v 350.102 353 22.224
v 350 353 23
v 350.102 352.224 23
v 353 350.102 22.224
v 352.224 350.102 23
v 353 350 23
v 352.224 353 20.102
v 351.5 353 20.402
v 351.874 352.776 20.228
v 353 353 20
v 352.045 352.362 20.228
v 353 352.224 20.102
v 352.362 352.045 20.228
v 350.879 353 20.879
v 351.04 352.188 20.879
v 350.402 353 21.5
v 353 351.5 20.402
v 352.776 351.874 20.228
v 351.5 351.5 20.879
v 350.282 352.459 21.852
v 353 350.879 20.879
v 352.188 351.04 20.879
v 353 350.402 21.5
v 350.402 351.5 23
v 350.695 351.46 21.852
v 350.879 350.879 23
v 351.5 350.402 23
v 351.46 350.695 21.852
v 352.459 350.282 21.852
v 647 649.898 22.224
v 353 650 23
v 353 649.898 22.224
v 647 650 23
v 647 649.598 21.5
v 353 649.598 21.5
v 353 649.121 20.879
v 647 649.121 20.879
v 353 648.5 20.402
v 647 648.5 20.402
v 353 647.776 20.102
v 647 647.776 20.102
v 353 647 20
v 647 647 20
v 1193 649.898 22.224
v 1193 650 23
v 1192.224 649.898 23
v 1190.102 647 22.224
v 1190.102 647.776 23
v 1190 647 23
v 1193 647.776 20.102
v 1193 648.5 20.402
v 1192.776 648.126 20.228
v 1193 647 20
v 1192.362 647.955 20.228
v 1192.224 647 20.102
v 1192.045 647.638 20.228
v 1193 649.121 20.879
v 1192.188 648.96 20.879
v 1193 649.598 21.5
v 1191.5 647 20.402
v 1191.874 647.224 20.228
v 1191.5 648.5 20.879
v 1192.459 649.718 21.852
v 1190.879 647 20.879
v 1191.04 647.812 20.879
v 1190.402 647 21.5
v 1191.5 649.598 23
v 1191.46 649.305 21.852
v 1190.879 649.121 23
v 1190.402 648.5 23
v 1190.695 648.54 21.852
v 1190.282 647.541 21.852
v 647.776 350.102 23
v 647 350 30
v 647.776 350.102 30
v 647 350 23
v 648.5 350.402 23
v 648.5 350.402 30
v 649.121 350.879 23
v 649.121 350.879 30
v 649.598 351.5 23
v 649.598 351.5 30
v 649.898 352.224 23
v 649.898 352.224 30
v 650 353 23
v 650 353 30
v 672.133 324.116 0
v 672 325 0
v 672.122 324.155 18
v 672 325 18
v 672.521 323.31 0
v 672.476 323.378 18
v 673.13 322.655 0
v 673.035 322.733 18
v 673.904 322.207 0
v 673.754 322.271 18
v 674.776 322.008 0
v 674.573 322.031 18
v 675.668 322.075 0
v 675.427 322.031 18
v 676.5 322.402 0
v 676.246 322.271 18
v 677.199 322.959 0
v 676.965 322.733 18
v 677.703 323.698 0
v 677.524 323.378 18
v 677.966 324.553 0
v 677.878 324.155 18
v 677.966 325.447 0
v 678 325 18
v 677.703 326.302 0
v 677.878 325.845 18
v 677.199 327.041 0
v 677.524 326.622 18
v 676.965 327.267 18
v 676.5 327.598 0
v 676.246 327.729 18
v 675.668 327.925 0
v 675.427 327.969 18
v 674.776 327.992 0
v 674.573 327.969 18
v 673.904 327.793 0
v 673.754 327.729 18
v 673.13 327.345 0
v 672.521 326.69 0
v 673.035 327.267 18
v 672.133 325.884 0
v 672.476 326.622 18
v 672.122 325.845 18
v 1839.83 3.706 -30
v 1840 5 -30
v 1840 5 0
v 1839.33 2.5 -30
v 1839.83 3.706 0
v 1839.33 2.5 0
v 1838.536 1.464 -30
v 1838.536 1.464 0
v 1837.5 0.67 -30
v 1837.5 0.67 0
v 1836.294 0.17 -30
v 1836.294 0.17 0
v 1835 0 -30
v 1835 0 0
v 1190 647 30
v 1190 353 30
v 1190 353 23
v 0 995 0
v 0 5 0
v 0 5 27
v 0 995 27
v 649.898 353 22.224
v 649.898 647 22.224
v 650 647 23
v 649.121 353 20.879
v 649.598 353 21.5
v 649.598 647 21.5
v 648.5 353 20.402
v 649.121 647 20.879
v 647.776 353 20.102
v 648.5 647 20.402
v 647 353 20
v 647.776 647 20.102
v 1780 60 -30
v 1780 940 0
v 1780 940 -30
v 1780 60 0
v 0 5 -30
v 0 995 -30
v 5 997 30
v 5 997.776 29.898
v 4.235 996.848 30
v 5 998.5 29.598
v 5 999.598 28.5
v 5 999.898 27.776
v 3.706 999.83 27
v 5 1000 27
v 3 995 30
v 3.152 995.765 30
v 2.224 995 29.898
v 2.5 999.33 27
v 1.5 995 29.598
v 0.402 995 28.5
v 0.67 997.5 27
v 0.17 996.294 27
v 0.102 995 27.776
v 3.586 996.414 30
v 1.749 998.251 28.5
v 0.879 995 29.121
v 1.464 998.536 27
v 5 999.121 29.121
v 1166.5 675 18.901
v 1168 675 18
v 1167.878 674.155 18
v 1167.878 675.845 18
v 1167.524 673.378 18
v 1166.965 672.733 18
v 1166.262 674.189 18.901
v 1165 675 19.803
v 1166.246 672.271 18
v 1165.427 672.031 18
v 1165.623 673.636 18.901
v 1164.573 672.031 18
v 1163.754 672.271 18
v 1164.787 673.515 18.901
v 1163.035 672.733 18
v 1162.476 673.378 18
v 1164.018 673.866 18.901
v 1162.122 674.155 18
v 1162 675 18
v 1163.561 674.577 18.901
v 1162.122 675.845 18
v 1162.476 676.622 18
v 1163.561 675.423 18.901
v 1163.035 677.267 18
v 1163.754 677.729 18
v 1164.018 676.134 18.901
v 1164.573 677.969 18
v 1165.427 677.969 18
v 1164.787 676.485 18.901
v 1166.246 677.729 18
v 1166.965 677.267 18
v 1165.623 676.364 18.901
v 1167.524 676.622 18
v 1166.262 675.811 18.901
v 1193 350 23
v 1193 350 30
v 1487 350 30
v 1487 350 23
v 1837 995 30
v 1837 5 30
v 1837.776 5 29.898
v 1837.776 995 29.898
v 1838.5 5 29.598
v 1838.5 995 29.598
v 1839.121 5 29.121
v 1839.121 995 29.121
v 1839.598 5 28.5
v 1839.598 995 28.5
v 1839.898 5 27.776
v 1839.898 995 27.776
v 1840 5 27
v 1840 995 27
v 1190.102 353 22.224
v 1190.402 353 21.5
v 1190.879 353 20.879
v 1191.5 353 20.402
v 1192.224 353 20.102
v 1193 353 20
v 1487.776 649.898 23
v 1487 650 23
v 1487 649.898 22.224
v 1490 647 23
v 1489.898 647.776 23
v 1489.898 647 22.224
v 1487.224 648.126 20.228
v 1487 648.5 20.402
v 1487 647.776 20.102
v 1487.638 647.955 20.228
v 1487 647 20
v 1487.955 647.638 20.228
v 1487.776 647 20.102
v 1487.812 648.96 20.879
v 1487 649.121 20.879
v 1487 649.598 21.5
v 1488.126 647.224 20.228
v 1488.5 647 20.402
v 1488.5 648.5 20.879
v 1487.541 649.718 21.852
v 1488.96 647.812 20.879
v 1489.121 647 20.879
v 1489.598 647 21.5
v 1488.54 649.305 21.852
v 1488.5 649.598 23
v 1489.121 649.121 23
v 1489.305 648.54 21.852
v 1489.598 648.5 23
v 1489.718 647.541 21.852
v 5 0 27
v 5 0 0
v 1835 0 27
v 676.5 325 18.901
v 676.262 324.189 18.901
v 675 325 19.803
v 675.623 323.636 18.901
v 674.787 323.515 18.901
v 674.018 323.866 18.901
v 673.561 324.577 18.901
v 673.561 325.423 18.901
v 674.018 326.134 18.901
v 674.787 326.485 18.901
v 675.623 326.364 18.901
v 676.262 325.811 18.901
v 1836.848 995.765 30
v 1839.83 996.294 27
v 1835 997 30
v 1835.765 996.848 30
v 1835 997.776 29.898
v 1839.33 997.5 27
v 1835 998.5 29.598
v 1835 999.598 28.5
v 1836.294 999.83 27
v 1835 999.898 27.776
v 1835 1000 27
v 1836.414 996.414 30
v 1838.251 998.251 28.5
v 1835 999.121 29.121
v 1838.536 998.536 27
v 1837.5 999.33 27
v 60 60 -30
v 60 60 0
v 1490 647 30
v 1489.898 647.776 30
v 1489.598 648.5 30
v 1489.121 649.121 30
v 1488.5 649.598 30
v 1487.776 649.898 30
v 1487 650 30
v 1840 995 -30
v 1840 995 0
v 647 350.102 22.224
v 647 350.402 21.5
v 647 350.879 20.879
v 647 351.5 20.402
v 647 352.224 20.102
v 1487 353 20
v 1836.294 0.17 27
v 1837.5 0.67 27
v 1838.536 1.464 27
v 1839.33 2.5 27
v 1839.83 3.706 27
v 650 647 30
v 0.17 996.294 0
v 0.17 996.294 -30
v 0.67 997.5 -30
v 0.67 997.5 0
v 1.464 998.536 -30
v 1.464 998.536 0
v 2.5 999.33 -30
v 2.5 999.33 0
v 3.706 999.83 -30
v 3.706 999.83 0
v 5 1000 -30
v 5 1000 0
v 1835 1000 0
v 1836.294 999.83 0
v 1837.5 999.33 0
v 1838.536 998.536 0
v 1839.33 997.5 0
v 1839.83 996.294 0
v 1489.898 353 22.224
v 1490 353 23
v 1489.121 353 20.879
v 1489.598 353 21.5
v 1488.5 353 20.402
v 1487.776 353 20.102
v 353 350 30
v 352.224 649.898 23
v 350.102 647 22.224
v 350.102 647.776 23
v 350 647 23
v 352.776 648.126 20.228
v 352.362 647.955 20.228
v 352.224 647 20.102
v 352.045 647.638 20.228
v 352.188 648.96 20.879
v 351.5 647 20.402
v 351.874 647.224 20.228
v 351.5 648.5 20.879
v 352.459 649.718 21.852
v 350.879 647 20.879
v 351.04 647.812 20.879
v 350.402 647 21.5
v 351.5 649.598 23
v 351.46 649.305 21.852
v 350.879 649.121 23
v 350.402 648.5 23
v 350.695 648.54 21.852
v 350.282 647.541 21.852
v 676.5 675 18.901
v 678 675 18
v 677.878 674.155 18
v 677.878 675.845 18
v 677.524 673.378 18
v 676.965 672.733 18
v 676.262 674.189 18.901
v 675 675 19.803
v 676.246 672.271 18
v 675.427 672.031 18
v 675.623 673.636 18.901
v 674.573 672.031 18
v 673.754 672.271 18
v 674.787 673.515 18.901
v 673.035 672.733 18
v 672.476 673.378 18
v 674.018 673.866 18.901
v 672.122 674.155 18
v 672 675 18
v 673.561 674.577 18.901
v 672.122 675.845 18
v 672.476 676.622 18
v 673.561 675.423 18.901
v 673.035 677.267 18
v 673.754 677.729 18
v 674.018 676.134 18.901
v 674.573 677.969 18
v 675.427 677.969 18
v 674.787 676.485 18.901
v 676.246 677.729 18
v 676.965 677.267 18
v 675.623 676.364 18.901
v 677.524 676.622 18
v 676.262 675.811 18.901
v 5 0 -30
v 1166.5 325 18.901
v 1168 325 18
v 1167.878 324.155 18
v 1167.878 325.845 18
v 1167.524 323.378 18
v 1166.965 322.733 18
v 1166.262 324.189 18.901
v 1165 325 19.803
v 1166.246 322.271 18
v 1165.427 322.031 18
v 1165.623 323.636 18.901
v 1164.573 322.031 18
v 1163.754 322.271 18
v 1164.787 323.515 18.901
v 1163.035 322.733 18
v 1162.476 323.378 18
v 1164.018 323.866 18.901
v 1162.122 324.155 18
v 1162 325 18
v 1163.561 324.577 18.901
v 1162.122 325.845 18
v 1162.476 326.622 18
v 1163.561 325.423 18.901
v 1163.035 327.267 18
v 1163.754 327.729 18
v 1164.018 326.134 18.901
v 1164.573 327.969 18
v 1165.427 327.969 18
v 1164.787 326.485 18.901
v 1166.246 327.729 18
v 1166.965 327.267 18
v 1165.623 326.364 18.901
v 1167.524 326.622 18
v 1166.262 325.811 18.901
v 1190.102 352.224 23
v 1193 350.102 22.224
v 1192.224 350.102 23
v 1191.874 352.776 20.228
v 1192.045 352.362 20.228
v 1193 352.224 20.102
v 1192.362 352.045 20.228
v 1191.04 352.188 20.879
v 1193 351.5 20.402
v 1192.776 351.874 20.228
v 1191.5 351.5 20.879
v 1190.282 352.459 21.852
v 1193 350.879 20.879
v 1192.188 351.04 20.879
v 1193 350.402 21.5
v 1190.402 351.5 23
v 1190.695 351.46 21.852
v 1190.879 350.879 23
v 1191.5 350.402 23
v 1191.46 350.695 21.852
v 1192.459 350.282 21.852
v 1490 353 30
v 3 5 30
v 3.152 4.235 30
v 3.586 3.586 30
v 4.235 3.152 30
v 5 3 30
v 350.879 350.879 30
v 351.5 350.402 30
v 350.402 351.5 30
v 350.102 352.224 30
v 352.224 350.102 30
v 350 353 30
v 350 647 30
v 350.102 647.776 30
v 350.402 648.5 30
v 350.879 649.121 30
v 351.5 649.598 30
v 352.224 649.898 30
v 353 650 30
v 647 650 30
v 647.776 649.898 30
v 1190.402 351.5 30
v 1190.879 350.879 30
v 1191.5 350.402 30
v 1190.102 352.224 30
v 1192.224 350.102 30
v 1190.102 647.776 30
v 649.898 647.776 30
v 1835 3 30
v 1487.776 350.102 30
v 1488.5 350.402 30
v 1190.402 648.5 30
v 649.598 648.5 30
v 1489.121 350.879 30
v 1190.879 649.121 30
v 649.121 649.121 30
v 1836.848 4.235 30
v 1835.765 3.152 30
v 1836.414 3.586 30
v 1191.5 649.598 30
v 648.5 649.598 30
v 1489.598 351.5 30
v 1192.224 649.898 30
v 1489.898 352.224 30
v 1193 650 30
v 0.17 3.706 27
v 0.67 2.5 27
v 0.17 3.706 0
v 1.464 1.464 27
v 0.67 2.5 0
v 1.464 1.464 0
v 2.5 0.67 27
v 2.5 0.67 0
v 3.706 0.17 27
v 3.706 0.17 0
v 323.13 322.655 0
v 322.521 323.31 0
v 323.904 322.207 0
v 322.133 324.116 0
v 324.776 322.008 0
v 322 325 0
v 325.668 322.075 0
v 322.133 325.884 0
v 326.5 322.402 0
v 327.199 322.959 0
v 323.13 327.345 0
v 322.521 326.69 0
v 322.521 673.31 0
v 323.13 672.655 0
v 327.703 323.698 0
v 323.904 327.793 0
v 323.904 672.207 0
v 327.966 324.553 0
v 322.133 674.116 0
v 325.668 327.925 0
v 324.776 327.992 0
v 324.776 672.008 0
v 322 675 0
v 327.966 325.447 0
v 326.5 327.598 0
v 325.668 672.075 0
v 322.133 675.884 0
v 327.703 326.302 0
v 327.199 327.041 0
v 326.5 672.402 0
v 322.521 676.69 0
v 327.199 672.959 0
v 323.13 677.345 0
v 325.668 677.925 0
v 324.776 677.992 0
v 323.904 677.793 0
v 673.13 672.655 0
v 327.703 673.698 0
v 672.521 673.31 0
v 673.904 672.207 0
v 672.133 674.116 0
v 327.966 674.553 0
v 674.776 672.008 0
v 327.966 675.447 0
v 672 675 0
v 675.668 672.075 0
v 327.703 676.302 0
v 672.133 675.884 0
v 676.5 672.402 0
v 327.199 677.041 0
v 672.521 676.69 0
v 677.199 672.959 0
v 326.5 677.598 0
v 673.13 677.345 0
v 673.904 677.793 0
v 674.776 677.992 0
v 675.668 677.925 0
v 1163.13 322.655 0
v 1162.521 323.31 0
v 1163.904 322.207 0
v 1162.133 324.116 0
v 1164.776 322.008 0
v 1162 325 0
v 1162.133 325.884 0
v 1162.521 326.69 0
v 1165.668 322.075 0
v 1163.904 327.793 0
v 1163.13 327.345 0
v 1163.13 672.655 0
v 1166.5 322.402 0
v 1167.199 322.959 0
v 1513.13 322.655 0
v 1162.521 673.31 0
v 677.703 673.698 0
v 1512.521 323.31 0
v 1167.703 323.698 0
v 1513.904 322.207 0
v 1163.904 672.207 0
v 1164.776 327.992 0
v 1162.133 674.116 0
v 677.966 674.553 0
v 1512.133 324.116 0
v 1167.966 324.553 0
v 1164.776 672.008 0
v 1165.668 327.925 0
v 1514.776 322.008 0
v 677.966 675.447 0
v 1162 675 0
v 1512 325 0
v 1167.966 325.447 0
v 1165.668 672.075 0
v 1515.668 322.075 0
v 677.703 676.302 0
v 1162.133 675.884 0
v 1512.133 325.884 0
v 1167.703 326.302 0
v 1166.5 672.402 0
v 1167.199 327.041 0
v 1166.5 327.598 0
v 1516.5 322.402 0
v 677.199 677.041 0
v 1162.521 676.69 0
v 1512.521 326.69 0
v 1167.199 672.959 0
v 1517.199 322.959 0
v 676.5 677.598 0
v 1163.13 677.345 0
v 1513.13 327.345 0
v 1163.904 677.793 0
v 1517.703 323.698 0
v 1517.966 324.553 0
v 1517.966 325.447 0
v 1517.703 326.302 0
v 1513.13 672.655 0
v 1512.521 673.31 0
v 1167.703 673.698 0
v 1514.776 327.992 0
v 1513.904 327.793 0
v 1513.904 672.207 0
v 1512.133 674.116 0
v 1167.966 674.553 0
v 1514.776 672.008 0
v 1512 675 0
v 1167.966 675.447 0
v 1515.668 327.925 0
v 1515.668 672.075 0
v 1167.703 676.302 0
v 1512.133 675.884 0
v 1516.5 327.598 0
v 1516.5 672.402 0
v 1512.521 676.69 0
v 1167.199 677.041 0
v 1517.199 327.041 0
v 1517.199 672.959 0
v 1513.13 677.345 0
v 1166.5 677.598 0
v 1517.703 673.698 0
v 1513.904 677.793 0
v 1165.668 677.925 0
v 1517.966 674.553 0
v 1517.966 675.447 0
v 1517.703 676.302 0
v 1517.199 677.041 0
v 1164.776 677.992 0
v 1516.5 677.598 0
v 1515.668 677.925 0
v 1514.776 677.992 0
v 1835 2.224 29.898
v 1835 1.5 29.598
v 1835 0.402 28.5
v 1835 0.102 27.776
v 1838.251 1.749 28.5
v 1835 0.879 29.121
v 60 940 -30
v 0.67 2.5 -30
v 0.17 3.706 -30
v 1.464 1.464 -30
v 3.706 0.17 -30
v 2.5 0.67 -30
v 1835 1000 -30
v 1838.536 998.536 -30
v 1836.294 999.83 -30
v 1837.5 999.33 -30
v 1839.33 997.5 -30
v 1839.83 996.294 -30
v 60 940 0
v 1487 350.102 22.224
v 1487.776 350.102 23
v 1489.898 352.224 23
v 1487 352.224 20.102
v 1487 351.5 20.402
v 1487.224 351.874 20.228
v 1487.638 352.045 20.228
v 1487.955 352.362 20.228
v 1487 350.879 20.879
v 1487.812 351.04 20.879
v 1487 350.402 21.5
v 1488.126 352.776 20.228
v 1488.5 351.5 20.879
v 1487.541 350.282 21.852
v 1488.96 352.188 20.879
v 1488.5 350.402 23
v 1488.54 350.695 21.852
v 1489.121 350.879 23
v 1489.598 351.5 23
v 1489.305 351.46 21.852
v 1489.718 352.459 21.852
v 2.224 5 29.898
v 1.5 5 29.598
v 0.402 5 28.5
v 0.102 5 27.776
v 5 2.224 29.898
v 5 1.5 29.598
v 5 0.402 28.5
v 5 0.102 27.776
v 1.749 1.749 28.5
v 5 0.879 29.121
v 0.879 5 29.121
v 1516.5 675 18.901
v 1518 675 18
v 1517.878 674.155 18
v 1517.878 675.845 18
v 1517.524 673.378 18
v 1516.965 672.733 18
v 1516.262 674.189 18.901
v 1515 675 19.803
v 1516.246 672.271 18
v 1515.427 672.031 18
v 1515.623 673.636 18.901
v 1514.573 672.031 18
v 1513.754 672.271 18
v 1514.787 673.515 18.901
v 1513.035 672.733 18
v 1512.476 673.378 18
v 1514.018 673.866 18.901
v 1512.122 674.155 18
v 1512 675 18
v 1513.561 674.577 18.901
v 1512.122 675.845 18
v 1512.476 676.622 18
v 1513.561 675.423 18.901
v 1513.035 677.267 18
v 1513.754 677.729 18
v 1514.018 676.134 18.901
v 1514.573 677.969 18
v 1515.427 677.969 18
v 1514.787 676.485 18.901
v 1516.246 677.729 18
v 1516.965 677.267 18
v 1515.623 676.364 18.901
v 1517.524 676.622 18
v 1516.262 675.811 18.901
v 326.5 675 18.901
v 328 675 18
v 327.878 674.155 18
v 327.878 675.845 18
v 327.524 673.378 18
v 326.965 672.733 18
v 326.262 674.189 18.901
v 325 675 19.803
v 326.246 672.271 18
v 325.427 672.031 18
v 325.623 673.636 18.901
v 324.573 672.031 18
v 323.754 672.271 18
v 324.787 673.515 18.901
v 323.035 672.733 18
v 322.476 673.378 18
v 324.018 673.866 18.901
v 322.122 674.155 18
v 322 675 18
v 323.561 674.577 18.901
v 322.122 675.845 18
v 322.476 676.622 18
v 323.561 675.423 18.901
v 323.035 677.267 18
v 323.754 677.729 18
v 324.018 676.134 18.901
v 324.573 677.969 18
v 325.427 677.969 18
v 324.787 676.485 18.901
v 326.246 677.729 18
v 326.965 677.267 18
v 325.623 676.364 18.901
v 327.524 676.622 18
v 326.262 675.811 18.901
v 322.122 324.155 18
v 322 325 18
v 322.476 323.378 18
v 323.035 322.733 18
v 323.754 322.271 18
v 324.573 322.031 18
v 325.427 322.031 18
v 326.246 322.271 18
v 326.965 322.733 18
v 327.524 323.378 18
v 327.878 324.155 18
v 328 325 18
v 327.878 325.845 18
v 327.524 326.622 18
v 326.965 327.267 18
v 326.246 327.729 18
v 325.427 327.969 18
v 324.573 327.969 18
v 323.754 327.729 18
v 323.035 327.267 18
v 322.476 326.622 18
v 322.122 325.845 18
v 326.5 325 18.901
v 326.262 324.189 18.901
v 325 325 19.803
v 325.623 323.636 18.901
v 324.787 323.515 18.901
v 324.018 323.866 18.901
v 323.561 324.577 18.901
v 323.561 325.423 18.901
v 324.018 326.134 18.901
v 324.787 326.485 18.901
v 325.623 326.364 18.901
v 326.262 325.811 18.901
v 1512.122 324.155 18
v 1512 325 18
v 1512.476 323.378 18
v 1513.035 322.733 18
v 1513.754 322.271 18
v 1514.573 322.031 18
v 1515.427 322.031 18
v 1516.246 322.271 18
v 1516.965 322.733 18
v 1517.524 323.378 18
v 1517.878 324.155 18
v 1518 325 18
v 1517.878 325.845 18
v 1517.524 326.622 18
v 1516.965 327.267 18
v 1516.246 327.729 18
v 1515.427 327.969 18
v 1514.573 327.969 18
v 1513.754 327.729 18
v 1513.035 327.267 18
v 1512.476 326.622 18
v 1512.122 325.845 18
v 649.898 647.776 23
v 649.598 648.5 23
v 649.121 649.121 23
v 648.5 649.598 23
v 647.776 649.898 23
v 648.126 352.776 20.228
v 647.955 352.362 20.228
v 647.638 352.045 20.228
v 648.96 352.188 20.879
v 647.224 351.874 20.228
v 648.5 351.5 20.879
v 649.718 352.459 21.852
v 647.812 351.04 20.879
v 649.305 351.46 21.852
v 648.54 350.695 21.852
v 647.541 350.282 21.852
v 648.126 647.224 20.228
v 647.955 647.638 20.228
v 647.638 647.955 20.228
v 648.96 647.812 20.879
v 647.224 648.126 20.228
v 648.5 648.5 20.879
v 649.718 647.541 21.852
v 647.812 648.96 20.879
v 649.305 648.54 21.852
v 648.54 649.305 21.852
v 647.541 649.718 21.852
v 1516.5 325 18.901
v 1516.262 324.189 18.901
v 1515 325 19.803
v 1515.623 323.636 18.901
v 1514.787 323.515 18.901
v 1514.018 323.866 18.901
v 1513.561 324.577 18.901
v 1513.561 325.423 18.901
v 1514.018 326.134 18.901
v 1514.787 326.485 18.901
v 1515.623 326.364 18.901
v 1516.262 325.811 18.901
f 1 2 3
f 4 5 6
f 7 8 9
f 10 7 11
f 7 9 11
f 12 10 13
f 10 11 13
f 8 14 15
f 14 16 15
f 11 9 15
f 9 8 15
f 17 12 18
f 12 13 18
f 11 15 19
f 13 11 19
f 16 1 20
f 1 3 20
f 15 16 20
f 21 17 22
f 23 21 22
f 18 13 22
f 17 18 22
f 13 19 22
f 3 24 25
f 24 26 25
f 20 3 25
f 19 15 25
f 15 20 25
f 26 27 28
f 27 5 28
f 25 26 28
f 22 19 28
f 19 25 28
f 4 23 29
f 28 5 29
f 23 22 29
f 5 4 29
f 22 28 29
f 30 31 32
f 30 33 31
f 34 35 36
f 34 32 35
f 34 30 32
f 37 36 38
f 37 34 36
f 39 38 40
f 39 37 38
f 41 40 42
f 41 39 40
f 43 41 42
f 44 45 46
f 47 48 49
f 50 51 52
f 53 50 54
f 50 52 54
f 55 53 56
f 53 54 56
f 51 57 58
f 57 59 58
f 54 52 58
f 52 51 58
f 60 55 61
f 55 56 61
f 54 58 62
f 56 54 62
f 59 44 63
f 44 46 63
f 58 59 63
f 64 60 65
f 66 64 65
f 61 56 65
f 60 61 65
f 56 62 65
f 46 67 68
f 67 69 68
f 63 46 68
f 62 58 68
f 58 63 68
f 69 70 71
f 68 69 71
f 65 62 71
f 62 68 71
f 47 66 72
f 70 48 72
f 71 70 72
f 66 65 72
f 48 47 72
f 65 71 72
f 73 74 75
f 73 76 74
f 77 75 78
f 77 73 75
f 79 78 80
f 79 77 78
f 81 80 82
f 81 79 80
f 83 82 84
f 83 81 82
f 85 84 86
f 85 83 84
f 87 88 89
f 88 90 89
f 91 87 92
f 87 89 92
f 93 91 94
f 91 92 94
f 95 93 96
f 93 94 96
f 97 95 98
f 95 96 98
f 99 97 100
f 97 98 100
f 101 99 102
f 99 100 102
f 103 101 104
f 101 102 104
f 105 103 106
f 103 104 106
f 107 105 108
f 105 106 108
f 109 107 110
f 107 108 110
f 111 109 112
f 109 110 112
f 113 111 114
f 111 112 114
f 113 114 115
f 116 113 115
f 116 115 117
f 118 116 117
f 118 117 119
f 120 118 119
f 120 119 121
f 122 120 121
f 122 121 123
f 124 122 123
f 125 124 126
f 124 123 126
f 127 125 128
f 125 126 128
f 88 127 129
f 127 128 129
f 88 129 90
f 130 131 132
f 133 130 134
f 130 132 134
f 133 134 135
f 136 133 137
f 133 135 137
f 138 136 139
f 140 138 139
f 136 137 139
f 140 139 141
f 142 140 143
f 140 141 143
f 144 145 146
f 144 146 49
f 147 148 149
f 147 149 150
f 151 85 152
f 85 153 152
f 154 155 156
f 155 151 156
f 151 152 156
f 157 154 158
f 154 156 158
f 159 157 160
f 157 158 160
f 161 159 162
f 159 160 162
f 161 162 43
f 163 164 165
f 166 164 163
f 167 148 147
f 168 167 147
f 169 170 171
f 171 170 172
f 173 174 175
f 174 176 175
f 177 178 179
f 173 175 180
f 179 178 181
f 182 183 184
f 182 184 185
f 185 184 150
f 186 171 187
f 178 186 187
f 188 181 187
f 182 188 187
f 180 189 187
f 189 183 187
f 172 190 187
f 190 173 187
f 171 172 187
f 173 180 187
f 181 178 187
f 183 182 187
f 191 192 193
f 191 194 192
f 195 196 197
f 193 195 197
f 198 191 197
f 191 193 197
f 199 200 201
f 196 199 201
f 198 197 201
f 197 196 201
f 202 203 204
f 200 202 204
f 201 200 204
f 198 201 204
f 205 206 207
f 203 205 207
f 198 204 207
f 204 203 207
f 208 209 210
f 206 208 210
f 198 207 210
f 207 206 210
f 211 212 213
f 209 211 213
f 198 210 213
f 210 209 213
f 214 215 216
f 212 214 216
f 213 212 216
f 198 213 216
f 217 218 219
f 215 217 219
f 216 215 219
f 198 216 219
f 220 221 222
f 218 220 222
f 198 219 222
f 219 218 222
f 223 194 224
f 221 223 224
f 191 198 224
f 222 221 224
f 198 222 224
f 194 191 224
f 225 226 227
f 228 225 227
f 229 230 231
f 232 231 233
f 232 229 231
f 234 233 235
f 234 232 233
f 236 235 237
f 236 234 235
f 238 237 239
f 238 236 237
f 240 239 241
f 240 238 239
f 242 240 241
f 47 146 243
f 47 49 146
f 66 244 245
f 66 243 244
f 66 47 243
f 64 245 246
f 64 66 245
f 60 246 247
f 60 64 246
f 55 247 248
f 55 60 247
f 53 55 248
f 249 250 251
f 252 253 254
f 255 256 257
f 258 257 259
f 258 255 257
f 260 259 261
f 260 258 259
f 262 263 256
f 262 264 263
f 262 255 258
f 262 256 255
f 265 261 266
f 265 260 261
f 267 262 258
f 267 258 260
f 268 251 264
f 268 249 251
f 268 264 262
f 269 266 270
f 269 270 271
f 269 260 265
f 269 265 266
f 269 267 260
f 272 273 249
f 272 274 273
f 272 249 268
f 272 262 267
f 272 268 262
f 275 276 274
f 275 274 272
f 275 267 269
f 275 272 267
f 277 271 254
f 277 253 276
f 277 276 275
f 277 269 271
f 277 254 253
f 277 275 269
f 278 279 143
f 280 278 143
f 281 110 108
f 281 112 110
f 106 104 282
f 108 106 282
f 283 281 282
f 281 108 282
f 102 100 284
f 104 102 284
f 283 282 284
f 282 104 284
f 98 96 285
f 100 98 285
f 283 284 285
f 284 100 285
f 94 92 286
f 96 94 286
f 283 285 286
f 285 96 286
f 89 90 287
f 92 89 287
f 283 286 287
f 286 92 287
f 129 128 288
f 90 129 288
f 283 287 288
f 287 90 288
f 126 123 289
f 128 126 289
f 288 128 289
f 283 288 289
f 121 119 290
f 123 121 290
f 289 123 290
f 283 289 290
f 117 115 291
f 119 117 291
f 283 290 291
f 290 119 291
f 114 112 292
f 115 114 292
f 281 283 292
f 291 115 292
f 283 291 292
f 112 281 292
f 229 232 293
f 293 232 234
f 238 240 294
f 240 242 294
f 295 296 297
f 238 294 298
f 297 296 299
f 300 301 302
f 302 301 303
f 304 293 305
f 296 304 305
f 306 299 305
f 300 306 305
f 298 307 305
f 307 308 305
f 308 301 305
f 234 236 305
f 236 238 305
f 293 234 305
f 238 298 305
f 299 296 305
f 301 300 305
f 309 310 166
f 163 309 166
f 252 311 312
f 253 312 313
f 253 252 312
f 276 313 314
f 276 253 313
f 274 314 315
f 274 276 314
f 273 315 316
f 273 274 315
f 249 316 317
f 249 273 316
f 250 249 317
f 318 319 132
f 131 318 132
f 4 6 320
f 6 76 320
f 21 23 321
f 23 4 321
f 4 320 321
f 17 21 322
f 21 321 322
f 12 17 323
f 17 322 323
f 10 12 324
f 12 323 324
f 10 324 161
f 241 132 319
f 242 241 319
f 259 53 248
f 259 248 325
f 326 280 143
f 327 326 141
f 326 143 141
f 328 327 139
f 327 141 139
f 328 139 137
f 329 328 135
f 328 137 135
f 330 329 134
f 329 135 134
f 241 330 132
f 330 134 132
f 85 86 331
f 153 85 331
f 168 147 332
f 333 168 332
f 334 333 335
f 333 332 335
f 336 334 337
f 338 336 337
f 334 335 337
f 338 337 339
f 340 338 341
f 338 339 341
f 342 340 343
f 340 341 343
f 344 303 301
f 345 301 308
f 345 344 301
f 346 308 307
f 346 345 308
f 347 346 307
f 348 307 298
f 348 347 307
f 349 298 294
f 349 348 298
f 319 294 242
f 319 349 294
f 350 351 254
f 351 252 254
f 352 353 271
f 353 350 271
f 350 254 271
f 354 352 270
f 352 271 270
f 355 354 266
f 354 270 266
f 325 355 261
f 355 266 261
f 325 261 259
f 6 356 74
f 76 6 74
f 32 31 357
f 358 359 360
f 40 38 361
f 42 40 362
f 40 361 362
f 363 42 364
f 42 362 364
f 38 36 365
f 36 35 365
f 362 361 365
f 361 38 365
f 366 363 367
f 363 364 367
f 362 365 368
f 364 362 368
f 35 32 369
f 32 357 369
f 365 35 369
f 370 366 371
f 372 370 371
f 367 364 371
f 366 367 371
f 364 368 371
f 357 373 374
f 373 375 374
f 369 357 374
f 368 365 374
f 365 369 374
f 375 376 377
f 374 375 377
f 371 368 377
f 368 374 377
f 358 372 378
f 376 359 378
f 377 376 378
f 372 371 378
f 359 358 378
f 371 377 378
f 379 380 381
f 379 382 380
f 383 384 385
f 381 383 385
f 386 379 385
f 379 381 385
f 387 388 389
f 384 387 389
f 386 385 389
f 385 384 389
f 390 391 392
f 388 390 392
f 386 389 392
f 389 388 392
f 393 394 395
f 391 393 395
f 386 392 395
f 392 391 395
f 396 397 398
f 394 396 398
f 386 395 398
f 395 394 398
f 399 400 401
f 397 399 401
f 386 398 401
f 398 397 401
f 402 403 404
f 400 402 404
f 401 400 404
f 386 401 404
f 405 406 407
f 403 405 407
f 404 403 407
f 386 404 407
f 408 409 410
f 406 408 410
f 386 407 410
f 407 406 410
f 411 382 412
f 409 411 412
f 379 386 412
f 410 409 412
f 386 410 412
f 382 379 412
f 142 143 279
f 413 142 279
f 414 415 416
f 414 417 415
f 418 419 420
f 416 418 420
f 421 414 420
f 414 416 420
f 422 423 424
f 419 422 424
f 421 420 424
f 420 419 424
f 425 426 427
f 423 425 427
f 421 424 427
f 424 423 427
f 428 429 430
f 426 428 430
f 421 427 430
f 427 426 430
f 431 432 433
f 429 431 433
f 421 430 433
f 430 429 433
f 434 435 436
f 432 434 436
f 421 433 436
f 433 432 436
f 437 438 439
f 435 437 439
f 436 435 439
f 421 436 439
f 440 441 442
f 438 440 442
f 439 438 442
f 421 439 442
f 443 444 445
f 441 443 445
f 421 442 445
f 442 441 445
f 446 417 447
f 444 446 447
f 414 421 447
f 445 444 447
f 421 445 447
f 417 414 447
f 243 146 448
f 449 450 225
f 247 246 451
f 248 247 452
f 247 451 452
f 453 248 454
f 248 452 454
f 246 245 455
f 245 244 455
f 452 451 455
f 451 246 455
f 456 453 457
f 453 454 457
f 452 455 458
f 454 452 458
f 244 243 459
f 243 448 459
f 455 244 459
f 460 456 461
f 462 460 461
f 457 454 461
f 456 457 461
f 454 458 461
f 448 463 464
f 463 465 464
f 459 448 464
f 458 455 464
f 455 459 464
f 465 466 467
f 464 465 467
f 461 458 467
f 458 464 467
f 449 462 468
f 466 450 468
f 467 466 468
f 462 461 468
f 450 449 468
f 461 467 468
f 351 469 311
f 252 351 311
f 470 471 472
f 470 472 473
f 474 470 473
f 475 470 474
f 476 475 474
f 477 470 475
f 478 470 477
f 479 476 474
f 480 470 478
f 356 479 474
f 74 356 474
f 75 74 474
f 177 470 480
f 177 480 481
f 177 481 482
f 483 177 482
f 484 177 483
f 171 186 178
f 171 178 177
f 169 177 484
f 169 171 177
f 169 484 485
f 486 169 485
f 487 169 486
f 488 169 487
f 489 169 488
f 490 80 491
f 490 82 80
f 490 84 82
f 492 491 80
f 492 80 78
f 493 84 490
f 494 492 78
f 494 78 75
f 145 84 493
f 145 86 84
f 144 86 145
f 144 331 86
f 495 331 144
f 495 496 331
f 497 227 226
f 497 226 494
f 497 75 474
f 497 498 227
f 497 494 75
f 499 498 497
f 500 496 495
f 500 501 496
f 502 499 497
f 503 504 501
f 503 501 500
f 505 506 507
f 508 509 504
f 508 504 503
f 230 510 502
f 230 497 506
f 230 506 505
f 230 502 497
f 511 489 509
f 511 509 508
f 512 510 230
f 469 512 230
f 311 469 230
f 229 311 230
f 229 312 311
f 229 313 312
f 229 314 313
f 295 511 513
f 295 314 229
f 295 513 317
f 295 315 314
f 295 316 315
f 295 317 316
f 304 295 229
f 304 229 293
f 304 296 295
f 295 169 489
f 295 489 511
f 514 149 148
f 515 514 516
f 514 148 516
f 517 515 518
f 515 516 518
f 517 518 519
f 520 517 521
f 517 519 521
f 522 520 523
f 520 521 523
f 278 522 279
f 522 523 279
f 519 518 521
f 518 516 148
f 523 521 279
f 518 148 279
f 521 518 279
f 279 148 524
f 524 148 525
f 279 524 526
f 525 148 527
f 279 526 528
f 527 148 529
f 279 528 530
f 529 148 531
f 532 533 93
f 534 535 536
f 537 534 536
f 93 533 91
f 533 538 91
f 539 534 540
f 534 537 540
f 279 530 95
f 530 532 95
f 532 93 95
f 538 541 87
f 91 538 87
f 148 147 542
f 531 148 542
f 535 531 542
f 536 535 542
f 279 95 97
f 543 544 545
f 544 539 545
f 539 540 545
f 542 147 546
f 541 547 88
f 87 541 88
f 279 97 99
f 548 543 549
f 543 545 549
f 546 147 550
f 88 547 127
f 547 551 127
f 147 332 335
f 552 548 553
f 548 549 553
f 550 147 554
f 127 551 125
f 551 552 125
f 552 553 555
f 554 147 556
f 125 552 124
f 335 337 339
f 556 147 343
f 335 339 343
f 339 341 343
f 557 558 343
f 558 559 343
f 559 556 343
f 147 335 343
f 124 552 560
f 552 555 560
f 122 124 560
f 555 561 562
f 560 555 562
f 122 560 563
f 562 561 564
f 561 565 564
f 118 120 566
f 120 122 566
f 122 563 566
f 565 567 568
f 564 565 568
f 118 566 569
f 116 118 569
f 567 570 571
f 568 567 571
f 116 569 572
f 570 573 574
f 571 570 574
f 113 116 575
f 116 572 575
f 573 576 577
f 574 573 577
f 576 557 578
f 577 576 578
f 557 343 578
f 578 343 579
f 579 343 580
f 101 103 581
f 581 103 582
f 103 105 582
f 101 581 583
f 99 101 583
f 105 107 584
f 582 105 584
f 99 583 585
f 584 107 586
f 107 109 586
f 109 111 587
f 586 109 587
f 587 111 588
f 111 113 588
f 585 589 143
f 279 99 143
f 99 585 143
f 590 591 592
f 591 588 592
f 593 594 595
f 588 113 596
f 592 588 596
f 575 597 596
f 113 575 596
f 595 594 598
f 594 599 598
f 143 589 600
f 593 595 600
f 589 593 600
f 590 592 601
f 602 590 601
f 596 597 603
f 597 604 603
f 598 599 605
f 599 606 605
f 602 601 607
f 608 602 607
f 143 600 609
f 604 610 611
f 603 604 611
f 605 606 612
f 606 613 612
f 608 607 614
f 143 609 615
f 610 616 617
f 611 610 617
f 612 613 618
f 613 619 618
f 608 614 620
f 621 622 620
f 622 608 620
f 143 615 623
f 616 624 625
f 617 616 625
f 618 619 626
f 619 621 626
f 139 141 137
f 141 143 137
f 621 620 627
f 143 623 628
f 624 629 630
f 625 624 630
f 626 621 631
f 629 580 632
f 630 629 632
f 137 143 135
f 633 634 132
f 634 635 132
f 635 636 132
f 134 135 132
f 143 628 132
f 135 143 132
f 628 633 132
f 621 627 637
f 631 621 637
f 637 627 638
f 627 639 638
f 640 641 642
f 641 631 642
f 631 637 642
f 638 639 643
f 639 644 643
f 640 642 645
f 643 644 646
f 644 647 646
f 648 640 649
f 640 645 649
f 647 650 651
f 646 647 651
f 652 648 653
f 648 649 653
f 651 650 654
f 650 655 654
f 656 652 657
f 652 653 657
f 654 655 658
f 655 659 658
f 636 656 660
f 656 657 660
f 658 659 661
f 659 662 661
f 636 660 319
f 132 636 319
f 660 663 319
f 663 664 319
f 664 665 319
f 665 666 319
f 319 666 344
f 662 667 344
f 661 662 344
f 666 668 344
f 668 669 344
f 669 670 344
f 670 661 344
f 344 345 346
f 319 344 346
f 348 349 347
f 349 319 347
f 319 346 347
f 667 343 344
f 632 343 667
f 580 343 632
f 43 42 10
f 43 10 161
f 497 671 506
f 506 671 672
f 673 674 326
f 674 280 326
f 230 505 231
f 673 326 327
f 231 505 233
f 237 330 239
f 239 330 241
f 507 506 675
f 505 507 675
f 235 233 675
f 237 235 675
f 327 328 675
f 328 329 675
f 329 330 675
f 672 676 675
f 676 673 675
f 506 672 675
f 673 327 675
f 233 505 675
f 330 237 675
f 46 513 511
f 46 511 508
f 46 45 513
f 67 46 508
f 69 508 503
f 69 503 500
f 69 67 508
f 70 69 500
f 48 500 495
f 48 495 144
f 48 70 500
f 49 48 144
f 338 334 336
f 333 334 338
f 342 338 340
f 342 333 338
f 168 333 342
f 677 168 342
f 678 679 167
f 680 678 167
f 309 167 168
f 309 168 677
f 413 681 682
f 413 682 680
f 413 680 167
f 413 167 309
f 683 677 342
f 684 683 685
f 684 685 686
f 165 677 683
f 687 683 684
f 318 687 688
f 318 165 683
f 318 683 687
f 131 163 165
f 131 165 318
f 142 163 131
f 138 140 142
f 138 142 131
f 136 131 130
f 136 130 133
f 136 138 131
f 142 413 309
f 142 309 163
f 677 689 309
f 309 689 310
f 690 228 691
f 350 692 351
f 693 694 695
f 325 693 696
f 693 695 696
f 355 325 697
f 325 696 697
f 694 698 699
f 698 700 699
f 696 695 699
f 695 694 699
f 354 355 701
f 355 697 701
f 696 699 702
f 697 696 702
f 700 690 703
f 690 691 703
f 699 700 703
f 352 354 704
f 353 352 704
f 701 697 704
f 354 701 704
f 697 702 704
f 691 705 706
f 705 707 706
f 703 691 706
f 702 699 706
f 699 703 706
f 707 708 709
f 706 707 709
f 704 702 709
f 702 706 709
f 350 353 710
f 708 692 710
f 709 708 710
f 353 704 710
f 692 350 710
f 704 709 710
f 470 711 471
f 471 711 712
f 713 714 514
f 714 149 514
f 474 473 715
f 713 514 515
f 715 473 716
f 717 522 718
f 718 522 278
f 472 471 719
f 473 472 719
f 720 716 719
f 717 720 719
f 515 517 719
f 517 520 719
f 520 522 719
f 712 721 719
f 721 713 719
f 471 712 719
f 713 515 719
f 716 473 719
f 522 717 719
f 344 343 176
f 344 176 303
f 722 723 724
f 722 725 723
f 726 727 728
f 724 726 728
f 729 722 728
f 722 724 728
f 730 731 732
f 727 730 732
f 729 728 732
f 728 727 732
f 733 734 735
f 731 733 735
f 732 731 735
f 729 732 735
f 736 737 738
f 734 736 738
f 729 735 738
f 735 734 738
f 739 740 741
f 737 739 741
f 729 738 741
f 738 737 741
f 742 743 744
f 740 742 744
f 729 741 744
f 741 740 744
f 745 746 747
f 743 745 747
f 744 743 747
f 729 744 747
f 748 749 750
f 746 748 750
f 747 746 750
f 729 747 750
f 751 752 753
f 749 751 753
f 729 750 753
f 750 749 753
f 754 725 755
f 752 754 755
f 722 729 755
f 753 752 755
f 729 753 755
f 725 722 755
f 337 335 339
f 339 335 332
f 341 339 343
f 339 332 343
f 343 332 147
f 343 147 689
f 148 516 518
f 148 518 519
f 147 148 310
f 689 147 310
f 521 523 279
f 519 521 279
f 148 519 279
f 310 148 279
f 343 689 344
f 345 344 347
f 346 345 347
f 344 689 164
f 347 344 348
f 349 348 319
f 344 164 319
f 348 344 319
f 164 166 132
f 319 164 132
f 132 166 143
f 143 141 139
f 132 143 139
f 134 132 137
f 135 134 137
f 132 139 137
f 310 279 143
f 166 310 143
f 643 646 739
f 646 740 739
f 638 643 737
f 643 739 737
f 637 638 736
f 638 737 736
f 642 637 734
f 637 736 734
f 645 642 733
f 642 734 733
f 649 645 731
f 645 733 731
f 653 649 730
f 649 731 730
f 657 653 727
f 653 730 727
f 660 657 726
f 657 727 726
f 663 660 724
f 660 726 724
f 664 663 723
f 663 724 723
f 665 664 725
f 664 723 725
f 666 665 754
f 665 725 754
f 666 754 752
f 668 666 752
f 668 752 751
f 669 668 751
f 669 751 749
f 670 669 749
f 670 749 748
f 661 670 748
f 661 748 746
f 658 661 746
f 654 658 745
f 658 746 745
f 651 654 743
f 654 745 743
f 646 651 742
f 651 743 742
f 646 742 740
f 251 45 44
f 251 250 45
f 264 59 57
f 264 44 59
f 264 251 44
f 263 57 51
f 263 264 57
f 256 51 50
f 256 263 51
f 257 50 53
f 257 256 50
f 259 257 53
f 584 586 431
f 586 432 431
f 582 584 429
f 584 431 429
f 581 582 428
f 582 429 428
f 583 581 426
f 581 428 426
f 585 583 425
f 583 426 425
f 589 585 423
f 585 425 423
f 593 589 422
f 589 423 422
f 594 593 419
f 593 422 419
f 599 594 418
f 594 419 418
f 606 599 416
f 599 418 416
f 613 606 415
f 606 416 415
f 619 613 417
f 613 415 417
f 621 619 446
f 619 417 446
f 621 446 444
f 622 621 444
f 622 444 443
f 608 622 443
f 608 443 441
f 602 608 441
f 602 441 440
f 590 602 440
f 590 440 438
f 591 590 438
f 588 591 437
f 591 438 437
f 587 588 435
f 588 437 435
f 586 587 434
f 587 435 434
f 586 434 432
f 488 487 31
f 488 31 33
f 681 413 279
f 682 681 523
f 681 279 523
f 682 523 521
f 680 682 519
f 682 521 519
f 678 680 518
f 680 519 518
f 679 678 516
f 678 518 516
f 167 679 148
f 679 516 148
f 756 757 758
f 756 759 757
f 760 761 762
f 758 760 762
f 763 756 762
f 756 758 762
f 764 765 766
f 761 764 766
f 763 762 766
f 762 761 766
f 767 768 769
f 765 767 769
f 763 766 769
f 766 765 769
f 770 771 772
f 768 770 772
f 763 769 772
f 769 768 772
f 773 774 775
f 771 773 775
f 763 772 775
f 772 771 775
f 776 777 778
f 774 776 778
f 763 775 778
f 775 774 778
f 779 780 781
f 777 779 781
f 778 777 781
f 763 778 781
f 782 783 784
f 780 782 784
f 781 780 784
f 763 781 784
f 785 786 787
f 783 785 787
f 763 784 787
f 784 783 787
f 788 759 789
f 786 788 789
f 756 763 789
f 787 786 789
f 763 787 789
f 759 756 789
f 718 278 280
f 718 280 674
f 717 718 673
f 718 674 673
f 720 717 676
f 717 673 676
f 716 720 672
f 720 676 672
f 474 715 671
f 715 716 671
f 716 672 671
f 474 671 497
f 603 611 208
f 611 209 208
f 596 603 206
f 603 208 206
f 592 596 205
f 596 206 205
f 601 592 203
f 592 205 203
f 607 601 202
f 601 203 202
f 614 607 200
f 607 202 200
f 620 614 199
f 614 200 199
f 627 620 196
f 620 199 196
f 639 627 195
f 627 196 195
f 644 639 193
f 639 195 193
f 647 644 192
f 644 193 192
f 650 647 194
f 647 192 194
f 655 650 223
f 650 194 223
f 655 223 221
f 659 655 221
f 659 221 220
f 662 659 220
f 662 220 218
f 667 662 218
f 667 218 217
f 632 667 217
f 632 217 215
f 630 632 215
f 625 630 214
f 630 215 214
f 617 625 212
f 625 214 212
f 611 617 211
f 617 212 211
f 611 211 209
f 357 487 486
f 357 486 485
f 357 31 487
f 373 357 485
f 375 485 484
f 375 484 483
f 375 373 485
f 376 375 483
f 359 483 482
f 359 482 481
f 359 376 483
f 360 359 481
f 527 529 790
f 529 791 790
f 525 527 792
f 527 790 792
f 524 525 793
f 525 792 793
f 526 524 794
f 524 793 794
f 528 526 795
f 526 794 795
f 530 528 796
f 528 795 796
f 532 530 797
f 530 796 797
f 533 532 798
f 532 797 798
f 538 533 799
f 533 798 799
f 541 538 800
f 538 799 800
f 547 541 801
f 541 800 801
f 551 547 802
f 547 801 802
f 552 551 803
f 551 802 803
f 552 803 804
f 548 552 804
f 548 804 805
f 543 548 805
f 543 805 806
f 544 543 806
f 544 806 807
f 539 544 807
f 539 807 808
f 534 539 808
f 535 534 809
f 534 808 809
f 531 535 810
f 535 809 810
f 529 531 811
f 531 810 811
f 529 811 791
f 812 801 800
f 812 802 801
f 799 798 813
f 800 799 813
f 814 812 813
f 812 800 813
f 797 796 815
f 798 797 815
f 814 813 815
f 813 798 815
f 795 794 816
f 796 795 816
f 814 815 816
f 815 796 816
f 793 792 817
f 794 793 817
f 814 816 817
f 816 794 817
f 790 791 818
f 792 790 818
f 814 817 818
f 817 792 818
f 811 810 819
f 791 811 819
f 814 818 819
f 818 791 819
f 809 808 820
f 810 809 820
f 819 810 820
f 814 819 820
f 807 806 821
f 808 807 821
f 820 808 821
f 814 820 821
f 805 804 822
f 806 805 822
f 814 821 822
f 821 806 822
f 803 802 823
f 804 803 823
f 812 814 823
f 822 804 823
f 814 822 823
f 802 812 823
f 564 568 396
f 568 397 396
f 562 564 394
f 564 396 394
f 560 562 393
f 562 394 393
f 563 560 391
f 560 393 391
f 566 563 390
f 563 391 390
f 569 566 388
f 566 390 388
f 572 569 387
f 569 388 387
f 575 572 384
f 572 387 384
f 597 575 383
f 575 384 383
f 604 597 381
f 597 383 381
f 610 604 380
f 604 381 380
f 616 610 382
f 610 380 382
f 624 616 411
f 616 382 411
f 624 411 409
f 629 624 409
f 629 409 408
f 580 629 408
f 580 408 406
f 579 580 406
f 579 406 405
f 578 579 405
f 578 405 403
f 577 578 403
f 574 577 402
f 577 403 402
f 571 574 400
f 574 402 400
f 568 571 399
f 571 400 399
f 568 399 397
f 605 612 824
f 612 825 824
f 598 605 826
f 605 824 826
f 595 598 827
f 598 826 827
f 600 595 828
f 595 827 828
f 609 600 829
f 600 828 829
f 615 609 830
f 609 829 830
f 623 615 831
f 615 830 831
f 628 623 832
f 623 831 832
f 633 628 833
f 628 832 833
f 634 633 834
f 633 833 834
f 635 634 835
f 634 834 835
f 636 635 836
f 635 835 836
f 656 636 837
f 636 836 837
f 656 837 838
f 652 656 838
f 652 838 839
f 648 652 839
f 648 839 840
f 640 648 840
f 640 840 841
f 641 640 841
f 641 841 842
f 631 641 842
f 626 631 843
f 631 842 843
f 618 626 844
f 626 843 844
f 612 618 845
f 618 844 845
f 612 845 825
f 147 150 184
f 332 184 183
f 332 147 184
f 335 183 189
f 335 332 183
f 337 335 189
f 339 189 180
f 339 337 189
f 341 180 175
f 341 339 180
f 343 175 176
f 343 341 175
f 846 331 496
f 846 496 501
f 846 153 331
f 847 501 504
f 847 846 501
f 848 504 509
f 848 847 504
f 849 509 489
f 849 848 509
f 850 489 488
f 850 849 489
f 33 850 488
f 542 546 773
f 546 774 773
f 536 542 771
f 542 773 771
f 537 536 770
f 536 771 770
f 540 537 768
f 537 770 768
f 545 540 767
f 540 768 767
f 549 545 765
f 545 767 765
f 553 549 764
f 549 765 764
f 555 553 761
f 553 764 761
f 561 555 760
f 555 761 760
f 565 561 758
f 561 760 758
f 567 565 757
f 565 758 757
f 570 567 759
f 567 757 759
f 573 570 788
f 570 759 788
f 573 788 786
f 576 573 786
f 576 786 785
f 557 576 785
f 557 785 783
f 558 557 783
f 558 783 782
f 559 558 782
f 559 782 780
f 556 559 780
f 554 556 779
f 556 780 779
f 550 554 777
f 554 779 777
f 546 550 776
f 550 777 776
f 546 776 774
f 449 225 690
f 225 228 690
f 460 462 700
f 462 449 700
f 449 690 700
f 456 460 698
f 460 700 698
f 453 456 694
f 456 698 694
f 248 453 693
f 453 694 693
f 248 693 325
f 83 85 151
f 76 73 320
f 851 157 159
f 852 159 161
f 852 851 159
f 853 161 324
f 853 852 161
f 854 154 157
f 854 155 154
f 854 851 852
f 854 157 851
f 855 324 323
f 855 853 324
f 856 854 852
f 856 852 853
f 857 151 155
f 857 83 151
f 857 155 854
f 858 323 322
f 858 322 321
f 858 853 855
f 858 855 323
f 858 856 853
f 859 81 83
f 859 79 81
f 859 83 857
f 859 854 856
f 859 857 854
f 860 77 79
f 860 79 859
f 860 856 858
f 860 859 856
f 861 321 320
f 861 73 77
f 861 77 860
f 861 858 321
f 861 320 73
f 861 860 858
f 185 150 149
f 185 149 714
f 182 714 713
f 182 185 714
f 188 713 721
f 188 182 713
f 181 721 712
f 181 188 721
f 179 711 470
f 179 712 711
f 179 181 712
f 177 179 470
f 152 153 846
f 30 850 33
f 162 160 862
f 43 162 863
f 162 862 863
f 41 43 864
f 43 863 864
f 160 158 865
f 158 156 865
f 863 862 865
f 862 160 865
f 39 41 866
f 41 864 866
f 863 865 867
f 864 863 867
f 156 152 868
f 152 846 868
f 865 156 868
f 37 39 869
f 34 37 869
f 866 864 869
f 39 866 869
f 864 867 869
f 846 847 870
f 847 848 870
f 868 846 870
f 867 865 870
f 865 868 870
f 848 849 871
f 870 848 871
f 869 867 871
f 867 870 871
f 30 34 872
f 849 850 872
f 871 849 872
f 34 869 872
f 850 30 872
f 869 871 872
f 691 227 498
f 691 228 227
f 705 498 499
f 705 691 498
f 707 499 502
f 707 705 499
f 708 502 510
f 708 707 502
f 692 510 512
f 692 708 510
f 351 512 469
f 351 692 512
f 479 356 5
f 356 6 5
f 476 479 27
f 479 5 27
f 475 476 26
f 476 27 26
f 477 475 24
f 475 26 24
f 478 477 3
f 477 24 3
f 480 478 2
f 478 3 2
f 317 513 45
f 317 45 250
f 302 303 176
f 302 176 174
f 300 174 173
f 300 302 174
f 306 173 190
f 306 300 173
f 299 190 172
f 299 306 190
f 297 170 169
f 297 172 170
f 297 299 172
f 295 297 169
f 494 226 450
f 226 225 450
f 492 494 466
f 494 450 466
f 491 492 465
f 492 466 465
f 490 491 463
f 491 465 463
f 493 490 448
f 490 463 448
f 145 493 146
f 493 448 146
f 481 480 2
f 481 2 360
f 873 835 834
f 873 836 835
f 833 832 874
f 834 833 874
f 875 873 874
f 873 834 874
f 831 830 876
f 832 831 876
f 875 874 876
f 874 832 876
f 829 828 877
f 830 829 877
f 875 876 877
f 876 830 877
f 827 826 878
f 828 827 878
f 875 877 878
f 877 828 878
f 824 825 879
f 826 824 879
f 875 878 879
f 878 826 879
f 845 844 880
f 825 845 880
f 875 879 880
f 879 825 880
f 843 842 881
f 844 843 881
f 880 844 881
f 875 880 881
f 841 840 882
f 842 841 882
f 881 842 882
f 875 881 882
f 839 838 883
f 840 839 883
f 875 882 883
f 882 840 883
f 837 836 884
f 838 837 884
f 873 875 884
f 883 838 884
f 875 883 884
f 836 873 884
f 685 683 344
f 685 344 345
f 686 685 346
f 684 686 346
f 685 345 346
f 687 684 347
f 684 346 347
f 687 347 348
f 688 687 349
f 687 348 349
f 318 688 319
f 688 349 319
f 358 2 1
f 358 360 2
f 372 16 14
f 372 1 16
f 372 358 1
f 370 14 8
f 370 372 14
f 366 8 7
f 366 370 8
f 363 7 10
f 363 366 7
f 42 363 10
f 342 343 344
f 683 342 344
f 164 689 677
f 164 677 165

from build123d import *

# Parameters (mm, degrees)
F0_W         = 1840
F0_H         = 1000
F1_DEPTH     = 30
F2_W         = 300
F2_H         = 300
F3_DEPTH     = 10
F4_R         = 3
F5_T1_DEPTH  = 42.5
F5_T4_ANGLE  = 90
F5_T6_ANGLE  = 90
F5_T8_ANGLE  = 90
F5_T10_ANGLE = 90
F7_D         = 6
F7_DEPTH     = 18
F7_TIP       = 1.8025818571
F8_W         = 1720
F8_H         = 880
F9_DEPTH     = 30


# Not quite as in the source:
# - a fillet or chamfer that OpenCascade refuses, or shapes differently, is made with other operations: its cross-section is extruded or revolved along the edge and cut away or added


with BuildPart() as f1:
    # F0 (on Top) → F1 (new body)
    with BuildSketch(Plane.XY):
        with Locations((920, 500)):
            Rectangle(F0_W, F0_H)
    extrude(amount=F1_DEPTH)

    # F2 (on face) → F3 (cut)
    with BuildSketch(Plane.XY.offset(30)):
        with Locations((1340, 500)):
            Rectangle(F2_W, F2_H)
        with Locations((500, 500)):
            Rectangle(F2_W, F2_H)
    extrude(amount=-F3_DEPTH, mode=Mode.SUBTRACT)

    # F4
    f4_edges = [f1.edges().sort_by_distance(p)[0] for p in [
        (1490, 650, 25),
        (1190, 650, 25),
        (1190, 350, 25),
        (1490, 350, 25),
        (650, 650, 25),
        (350, 650, 25),
        (350, 350, 25),
        (650, 350, 25),
        (1340, 650, 20),
        (1190, 500, 20),
        (1340, 350, 20),
        (1490, 500, 20),
        (650, 500, 20),
        (500, 650, 20),
        (350, 500, 20),
        (500, 350, 20),
        (0, 500, 30),
        (920, 0, 30),
        (1840, 500, 30),
        (920, 1000, 30),
    ]]
    fillet(f4_edges, radius=F4_R)

    # F5: fillet of radius 5 on 4 edges, made by hand

    # F5_s2 → F5_t1 (cut)
    with BuildSketch(Plane.XY.offset(-12.5)):
        with BuildLine():
            ThreePointArc((1835, 1000), (1838.5355339059, 998.5355339059), (1840, 995))
            Line((1840, 995), (1840, 1000))
            Line((1840, 1000), (1835, 1000))
        make_face()
        with BuildLine():
            ThreePointArc((1835, 0), (1838.5355339059, 1.4644660941), (1840, 5))
            Line((1840, 5), (1840, 0))
            Line((1840, 0), (1835, 0))
        make_face()
        with BuildLine():
            ThreePointArc((0, 5), (1.4644660941, 1.4644660941), (5, 0))
            Line((5, 0), (0, 0))
            Line((0, 0), (0, 5))
        make_face()
        with BuildLine():
            ThreePointArc((0, 995), (1.4644660941, 998.5355339059), (5, 1000))
            Line((5, 1000), (0, 1000))
            Line((0, 1000), (0, 995))
        make_face()
    extrude(amount=F5_T1_DEPTH, mode=Mode.SUBTRACT)

    # F5_s3 → F5_t4 (revolve, cut)
    with BuildSketch(Plane.YZ.offset(5)):
        with BuildLine():
            ThreePointArc((997, 30), (999.1213203436, 29.1213203436), (1000, 27))
            Line((1000, 27), (1000, 30))
            Line((1000, 30), (997, 30))
        make_face()
    revolve(axis=Axis((5, 995, 30), (0, 0, 1)), revolution_arc=F5_T4_ANGLE, mode=Mode.SUBTRACT)

    # F5_s5 → F5_t6 (revolve, cut)
    with BuildSketch(Plane.XZ.offset(-5)):
        with BuildLine():
            ThreePointArc((3, 30), (0.8786796564, 29.1213203436), (0, 27))
            Line((0, 27), (0, 30))
            Line((0, 30), (3, 30))
        make_face()
    revolve(axis=Axis((5, 5, 30), (0, 0, 1)), revolution_arc=F5_T6_ANGLE, mode=Mode.SUBTRACT)

    # F5_s7 → F5_t8 (revolve, cut)
    with BuildSketch(Plane.YZ.offset(1835)):
        with BuildLine():
            ThreePointArc((3, 30), (0.8786796564, 29.1213203436), (0, 27))
            Line((0, 27), (0, 30))
            Line((0, 30), (3, 30))
        make_face()
    revolve(axis=Axis((1835, 5, 30), (0, 0, 1)), revolution_arc=F5_T8_ANGLE, mode=Mode.SUBTRACT)

    # F5_s9 → F5_t10 (revolve, cut)
    with BuildSketch(Plane.XZ.offset(-995)):
        with BuildLine():
            ThreePointArc((1837, 30), (1839.1213203436, 29.1213203436), (1840, 27))
            Line((1840, 27), (1840, 30))
            Line((1840, 30), (1837, 30))
        make_face()
    revolve(axis=Axis((1835, 995, 30), (0, 0, 1)), revolution_arc=F5_T10_ANGLE, mode=Mode.SUBTRACT)

    # F7
    with Locations(Plane(origin=(0, 0, 0), x_dir=(1, 0, 0), z_dir=(0, 0, -1))):
        with Locations((325, -325), (675, -325), (325, -675), (675, -675), (1165, -675), (1165, -325), (1515, -325), (1515, -675)):
            Hole(F7_D / 2, depth=F7_DEPTH)
            with Locations((0, 0, -(F7_DEPTH + F7_TIP / 2))):  # 118° drill point
                Cone(0, F7_D / 2, F7_TIP, mode=Mode.SUBTRACT)


with BuildPart() as f9:
    # F8 (on face) → F9 (new body)
    with BuildSketch(Plane(origin=(0, 0, 0), x_dir=(1, 0, 0), z_dir=(0, 0, -1))):
        with BuildLine():
            Line((1835, 0), (5, 0))
            ThreePointArc((5, 0), (1.4644660941, -1.4644660941), (0, -5))
            Line((0, -5), (0, -995))
            ThreePointArc((0, -995), (1.4644660941, -998.5355339059), (5, -1000))
            Line((5, -1000), (1835, -1000))
            ThreePointArc((1835, -1000), (1838.5355339059, -998.5355339059), (1840, -995))
            Line((1840, -995), (1840, -5))
            ThreePointArc((1840, -5), (1838.5355339059, -1.4644660941), (1835, 0))
        make_face()
        with Locations((920, -500)):
            Rectangle(F8_W, F8_H, mode=Mode.SUBTRACT)
    extrude(amount=F9_DEPTH)


solid = Compound([f1.part, f9.part])
